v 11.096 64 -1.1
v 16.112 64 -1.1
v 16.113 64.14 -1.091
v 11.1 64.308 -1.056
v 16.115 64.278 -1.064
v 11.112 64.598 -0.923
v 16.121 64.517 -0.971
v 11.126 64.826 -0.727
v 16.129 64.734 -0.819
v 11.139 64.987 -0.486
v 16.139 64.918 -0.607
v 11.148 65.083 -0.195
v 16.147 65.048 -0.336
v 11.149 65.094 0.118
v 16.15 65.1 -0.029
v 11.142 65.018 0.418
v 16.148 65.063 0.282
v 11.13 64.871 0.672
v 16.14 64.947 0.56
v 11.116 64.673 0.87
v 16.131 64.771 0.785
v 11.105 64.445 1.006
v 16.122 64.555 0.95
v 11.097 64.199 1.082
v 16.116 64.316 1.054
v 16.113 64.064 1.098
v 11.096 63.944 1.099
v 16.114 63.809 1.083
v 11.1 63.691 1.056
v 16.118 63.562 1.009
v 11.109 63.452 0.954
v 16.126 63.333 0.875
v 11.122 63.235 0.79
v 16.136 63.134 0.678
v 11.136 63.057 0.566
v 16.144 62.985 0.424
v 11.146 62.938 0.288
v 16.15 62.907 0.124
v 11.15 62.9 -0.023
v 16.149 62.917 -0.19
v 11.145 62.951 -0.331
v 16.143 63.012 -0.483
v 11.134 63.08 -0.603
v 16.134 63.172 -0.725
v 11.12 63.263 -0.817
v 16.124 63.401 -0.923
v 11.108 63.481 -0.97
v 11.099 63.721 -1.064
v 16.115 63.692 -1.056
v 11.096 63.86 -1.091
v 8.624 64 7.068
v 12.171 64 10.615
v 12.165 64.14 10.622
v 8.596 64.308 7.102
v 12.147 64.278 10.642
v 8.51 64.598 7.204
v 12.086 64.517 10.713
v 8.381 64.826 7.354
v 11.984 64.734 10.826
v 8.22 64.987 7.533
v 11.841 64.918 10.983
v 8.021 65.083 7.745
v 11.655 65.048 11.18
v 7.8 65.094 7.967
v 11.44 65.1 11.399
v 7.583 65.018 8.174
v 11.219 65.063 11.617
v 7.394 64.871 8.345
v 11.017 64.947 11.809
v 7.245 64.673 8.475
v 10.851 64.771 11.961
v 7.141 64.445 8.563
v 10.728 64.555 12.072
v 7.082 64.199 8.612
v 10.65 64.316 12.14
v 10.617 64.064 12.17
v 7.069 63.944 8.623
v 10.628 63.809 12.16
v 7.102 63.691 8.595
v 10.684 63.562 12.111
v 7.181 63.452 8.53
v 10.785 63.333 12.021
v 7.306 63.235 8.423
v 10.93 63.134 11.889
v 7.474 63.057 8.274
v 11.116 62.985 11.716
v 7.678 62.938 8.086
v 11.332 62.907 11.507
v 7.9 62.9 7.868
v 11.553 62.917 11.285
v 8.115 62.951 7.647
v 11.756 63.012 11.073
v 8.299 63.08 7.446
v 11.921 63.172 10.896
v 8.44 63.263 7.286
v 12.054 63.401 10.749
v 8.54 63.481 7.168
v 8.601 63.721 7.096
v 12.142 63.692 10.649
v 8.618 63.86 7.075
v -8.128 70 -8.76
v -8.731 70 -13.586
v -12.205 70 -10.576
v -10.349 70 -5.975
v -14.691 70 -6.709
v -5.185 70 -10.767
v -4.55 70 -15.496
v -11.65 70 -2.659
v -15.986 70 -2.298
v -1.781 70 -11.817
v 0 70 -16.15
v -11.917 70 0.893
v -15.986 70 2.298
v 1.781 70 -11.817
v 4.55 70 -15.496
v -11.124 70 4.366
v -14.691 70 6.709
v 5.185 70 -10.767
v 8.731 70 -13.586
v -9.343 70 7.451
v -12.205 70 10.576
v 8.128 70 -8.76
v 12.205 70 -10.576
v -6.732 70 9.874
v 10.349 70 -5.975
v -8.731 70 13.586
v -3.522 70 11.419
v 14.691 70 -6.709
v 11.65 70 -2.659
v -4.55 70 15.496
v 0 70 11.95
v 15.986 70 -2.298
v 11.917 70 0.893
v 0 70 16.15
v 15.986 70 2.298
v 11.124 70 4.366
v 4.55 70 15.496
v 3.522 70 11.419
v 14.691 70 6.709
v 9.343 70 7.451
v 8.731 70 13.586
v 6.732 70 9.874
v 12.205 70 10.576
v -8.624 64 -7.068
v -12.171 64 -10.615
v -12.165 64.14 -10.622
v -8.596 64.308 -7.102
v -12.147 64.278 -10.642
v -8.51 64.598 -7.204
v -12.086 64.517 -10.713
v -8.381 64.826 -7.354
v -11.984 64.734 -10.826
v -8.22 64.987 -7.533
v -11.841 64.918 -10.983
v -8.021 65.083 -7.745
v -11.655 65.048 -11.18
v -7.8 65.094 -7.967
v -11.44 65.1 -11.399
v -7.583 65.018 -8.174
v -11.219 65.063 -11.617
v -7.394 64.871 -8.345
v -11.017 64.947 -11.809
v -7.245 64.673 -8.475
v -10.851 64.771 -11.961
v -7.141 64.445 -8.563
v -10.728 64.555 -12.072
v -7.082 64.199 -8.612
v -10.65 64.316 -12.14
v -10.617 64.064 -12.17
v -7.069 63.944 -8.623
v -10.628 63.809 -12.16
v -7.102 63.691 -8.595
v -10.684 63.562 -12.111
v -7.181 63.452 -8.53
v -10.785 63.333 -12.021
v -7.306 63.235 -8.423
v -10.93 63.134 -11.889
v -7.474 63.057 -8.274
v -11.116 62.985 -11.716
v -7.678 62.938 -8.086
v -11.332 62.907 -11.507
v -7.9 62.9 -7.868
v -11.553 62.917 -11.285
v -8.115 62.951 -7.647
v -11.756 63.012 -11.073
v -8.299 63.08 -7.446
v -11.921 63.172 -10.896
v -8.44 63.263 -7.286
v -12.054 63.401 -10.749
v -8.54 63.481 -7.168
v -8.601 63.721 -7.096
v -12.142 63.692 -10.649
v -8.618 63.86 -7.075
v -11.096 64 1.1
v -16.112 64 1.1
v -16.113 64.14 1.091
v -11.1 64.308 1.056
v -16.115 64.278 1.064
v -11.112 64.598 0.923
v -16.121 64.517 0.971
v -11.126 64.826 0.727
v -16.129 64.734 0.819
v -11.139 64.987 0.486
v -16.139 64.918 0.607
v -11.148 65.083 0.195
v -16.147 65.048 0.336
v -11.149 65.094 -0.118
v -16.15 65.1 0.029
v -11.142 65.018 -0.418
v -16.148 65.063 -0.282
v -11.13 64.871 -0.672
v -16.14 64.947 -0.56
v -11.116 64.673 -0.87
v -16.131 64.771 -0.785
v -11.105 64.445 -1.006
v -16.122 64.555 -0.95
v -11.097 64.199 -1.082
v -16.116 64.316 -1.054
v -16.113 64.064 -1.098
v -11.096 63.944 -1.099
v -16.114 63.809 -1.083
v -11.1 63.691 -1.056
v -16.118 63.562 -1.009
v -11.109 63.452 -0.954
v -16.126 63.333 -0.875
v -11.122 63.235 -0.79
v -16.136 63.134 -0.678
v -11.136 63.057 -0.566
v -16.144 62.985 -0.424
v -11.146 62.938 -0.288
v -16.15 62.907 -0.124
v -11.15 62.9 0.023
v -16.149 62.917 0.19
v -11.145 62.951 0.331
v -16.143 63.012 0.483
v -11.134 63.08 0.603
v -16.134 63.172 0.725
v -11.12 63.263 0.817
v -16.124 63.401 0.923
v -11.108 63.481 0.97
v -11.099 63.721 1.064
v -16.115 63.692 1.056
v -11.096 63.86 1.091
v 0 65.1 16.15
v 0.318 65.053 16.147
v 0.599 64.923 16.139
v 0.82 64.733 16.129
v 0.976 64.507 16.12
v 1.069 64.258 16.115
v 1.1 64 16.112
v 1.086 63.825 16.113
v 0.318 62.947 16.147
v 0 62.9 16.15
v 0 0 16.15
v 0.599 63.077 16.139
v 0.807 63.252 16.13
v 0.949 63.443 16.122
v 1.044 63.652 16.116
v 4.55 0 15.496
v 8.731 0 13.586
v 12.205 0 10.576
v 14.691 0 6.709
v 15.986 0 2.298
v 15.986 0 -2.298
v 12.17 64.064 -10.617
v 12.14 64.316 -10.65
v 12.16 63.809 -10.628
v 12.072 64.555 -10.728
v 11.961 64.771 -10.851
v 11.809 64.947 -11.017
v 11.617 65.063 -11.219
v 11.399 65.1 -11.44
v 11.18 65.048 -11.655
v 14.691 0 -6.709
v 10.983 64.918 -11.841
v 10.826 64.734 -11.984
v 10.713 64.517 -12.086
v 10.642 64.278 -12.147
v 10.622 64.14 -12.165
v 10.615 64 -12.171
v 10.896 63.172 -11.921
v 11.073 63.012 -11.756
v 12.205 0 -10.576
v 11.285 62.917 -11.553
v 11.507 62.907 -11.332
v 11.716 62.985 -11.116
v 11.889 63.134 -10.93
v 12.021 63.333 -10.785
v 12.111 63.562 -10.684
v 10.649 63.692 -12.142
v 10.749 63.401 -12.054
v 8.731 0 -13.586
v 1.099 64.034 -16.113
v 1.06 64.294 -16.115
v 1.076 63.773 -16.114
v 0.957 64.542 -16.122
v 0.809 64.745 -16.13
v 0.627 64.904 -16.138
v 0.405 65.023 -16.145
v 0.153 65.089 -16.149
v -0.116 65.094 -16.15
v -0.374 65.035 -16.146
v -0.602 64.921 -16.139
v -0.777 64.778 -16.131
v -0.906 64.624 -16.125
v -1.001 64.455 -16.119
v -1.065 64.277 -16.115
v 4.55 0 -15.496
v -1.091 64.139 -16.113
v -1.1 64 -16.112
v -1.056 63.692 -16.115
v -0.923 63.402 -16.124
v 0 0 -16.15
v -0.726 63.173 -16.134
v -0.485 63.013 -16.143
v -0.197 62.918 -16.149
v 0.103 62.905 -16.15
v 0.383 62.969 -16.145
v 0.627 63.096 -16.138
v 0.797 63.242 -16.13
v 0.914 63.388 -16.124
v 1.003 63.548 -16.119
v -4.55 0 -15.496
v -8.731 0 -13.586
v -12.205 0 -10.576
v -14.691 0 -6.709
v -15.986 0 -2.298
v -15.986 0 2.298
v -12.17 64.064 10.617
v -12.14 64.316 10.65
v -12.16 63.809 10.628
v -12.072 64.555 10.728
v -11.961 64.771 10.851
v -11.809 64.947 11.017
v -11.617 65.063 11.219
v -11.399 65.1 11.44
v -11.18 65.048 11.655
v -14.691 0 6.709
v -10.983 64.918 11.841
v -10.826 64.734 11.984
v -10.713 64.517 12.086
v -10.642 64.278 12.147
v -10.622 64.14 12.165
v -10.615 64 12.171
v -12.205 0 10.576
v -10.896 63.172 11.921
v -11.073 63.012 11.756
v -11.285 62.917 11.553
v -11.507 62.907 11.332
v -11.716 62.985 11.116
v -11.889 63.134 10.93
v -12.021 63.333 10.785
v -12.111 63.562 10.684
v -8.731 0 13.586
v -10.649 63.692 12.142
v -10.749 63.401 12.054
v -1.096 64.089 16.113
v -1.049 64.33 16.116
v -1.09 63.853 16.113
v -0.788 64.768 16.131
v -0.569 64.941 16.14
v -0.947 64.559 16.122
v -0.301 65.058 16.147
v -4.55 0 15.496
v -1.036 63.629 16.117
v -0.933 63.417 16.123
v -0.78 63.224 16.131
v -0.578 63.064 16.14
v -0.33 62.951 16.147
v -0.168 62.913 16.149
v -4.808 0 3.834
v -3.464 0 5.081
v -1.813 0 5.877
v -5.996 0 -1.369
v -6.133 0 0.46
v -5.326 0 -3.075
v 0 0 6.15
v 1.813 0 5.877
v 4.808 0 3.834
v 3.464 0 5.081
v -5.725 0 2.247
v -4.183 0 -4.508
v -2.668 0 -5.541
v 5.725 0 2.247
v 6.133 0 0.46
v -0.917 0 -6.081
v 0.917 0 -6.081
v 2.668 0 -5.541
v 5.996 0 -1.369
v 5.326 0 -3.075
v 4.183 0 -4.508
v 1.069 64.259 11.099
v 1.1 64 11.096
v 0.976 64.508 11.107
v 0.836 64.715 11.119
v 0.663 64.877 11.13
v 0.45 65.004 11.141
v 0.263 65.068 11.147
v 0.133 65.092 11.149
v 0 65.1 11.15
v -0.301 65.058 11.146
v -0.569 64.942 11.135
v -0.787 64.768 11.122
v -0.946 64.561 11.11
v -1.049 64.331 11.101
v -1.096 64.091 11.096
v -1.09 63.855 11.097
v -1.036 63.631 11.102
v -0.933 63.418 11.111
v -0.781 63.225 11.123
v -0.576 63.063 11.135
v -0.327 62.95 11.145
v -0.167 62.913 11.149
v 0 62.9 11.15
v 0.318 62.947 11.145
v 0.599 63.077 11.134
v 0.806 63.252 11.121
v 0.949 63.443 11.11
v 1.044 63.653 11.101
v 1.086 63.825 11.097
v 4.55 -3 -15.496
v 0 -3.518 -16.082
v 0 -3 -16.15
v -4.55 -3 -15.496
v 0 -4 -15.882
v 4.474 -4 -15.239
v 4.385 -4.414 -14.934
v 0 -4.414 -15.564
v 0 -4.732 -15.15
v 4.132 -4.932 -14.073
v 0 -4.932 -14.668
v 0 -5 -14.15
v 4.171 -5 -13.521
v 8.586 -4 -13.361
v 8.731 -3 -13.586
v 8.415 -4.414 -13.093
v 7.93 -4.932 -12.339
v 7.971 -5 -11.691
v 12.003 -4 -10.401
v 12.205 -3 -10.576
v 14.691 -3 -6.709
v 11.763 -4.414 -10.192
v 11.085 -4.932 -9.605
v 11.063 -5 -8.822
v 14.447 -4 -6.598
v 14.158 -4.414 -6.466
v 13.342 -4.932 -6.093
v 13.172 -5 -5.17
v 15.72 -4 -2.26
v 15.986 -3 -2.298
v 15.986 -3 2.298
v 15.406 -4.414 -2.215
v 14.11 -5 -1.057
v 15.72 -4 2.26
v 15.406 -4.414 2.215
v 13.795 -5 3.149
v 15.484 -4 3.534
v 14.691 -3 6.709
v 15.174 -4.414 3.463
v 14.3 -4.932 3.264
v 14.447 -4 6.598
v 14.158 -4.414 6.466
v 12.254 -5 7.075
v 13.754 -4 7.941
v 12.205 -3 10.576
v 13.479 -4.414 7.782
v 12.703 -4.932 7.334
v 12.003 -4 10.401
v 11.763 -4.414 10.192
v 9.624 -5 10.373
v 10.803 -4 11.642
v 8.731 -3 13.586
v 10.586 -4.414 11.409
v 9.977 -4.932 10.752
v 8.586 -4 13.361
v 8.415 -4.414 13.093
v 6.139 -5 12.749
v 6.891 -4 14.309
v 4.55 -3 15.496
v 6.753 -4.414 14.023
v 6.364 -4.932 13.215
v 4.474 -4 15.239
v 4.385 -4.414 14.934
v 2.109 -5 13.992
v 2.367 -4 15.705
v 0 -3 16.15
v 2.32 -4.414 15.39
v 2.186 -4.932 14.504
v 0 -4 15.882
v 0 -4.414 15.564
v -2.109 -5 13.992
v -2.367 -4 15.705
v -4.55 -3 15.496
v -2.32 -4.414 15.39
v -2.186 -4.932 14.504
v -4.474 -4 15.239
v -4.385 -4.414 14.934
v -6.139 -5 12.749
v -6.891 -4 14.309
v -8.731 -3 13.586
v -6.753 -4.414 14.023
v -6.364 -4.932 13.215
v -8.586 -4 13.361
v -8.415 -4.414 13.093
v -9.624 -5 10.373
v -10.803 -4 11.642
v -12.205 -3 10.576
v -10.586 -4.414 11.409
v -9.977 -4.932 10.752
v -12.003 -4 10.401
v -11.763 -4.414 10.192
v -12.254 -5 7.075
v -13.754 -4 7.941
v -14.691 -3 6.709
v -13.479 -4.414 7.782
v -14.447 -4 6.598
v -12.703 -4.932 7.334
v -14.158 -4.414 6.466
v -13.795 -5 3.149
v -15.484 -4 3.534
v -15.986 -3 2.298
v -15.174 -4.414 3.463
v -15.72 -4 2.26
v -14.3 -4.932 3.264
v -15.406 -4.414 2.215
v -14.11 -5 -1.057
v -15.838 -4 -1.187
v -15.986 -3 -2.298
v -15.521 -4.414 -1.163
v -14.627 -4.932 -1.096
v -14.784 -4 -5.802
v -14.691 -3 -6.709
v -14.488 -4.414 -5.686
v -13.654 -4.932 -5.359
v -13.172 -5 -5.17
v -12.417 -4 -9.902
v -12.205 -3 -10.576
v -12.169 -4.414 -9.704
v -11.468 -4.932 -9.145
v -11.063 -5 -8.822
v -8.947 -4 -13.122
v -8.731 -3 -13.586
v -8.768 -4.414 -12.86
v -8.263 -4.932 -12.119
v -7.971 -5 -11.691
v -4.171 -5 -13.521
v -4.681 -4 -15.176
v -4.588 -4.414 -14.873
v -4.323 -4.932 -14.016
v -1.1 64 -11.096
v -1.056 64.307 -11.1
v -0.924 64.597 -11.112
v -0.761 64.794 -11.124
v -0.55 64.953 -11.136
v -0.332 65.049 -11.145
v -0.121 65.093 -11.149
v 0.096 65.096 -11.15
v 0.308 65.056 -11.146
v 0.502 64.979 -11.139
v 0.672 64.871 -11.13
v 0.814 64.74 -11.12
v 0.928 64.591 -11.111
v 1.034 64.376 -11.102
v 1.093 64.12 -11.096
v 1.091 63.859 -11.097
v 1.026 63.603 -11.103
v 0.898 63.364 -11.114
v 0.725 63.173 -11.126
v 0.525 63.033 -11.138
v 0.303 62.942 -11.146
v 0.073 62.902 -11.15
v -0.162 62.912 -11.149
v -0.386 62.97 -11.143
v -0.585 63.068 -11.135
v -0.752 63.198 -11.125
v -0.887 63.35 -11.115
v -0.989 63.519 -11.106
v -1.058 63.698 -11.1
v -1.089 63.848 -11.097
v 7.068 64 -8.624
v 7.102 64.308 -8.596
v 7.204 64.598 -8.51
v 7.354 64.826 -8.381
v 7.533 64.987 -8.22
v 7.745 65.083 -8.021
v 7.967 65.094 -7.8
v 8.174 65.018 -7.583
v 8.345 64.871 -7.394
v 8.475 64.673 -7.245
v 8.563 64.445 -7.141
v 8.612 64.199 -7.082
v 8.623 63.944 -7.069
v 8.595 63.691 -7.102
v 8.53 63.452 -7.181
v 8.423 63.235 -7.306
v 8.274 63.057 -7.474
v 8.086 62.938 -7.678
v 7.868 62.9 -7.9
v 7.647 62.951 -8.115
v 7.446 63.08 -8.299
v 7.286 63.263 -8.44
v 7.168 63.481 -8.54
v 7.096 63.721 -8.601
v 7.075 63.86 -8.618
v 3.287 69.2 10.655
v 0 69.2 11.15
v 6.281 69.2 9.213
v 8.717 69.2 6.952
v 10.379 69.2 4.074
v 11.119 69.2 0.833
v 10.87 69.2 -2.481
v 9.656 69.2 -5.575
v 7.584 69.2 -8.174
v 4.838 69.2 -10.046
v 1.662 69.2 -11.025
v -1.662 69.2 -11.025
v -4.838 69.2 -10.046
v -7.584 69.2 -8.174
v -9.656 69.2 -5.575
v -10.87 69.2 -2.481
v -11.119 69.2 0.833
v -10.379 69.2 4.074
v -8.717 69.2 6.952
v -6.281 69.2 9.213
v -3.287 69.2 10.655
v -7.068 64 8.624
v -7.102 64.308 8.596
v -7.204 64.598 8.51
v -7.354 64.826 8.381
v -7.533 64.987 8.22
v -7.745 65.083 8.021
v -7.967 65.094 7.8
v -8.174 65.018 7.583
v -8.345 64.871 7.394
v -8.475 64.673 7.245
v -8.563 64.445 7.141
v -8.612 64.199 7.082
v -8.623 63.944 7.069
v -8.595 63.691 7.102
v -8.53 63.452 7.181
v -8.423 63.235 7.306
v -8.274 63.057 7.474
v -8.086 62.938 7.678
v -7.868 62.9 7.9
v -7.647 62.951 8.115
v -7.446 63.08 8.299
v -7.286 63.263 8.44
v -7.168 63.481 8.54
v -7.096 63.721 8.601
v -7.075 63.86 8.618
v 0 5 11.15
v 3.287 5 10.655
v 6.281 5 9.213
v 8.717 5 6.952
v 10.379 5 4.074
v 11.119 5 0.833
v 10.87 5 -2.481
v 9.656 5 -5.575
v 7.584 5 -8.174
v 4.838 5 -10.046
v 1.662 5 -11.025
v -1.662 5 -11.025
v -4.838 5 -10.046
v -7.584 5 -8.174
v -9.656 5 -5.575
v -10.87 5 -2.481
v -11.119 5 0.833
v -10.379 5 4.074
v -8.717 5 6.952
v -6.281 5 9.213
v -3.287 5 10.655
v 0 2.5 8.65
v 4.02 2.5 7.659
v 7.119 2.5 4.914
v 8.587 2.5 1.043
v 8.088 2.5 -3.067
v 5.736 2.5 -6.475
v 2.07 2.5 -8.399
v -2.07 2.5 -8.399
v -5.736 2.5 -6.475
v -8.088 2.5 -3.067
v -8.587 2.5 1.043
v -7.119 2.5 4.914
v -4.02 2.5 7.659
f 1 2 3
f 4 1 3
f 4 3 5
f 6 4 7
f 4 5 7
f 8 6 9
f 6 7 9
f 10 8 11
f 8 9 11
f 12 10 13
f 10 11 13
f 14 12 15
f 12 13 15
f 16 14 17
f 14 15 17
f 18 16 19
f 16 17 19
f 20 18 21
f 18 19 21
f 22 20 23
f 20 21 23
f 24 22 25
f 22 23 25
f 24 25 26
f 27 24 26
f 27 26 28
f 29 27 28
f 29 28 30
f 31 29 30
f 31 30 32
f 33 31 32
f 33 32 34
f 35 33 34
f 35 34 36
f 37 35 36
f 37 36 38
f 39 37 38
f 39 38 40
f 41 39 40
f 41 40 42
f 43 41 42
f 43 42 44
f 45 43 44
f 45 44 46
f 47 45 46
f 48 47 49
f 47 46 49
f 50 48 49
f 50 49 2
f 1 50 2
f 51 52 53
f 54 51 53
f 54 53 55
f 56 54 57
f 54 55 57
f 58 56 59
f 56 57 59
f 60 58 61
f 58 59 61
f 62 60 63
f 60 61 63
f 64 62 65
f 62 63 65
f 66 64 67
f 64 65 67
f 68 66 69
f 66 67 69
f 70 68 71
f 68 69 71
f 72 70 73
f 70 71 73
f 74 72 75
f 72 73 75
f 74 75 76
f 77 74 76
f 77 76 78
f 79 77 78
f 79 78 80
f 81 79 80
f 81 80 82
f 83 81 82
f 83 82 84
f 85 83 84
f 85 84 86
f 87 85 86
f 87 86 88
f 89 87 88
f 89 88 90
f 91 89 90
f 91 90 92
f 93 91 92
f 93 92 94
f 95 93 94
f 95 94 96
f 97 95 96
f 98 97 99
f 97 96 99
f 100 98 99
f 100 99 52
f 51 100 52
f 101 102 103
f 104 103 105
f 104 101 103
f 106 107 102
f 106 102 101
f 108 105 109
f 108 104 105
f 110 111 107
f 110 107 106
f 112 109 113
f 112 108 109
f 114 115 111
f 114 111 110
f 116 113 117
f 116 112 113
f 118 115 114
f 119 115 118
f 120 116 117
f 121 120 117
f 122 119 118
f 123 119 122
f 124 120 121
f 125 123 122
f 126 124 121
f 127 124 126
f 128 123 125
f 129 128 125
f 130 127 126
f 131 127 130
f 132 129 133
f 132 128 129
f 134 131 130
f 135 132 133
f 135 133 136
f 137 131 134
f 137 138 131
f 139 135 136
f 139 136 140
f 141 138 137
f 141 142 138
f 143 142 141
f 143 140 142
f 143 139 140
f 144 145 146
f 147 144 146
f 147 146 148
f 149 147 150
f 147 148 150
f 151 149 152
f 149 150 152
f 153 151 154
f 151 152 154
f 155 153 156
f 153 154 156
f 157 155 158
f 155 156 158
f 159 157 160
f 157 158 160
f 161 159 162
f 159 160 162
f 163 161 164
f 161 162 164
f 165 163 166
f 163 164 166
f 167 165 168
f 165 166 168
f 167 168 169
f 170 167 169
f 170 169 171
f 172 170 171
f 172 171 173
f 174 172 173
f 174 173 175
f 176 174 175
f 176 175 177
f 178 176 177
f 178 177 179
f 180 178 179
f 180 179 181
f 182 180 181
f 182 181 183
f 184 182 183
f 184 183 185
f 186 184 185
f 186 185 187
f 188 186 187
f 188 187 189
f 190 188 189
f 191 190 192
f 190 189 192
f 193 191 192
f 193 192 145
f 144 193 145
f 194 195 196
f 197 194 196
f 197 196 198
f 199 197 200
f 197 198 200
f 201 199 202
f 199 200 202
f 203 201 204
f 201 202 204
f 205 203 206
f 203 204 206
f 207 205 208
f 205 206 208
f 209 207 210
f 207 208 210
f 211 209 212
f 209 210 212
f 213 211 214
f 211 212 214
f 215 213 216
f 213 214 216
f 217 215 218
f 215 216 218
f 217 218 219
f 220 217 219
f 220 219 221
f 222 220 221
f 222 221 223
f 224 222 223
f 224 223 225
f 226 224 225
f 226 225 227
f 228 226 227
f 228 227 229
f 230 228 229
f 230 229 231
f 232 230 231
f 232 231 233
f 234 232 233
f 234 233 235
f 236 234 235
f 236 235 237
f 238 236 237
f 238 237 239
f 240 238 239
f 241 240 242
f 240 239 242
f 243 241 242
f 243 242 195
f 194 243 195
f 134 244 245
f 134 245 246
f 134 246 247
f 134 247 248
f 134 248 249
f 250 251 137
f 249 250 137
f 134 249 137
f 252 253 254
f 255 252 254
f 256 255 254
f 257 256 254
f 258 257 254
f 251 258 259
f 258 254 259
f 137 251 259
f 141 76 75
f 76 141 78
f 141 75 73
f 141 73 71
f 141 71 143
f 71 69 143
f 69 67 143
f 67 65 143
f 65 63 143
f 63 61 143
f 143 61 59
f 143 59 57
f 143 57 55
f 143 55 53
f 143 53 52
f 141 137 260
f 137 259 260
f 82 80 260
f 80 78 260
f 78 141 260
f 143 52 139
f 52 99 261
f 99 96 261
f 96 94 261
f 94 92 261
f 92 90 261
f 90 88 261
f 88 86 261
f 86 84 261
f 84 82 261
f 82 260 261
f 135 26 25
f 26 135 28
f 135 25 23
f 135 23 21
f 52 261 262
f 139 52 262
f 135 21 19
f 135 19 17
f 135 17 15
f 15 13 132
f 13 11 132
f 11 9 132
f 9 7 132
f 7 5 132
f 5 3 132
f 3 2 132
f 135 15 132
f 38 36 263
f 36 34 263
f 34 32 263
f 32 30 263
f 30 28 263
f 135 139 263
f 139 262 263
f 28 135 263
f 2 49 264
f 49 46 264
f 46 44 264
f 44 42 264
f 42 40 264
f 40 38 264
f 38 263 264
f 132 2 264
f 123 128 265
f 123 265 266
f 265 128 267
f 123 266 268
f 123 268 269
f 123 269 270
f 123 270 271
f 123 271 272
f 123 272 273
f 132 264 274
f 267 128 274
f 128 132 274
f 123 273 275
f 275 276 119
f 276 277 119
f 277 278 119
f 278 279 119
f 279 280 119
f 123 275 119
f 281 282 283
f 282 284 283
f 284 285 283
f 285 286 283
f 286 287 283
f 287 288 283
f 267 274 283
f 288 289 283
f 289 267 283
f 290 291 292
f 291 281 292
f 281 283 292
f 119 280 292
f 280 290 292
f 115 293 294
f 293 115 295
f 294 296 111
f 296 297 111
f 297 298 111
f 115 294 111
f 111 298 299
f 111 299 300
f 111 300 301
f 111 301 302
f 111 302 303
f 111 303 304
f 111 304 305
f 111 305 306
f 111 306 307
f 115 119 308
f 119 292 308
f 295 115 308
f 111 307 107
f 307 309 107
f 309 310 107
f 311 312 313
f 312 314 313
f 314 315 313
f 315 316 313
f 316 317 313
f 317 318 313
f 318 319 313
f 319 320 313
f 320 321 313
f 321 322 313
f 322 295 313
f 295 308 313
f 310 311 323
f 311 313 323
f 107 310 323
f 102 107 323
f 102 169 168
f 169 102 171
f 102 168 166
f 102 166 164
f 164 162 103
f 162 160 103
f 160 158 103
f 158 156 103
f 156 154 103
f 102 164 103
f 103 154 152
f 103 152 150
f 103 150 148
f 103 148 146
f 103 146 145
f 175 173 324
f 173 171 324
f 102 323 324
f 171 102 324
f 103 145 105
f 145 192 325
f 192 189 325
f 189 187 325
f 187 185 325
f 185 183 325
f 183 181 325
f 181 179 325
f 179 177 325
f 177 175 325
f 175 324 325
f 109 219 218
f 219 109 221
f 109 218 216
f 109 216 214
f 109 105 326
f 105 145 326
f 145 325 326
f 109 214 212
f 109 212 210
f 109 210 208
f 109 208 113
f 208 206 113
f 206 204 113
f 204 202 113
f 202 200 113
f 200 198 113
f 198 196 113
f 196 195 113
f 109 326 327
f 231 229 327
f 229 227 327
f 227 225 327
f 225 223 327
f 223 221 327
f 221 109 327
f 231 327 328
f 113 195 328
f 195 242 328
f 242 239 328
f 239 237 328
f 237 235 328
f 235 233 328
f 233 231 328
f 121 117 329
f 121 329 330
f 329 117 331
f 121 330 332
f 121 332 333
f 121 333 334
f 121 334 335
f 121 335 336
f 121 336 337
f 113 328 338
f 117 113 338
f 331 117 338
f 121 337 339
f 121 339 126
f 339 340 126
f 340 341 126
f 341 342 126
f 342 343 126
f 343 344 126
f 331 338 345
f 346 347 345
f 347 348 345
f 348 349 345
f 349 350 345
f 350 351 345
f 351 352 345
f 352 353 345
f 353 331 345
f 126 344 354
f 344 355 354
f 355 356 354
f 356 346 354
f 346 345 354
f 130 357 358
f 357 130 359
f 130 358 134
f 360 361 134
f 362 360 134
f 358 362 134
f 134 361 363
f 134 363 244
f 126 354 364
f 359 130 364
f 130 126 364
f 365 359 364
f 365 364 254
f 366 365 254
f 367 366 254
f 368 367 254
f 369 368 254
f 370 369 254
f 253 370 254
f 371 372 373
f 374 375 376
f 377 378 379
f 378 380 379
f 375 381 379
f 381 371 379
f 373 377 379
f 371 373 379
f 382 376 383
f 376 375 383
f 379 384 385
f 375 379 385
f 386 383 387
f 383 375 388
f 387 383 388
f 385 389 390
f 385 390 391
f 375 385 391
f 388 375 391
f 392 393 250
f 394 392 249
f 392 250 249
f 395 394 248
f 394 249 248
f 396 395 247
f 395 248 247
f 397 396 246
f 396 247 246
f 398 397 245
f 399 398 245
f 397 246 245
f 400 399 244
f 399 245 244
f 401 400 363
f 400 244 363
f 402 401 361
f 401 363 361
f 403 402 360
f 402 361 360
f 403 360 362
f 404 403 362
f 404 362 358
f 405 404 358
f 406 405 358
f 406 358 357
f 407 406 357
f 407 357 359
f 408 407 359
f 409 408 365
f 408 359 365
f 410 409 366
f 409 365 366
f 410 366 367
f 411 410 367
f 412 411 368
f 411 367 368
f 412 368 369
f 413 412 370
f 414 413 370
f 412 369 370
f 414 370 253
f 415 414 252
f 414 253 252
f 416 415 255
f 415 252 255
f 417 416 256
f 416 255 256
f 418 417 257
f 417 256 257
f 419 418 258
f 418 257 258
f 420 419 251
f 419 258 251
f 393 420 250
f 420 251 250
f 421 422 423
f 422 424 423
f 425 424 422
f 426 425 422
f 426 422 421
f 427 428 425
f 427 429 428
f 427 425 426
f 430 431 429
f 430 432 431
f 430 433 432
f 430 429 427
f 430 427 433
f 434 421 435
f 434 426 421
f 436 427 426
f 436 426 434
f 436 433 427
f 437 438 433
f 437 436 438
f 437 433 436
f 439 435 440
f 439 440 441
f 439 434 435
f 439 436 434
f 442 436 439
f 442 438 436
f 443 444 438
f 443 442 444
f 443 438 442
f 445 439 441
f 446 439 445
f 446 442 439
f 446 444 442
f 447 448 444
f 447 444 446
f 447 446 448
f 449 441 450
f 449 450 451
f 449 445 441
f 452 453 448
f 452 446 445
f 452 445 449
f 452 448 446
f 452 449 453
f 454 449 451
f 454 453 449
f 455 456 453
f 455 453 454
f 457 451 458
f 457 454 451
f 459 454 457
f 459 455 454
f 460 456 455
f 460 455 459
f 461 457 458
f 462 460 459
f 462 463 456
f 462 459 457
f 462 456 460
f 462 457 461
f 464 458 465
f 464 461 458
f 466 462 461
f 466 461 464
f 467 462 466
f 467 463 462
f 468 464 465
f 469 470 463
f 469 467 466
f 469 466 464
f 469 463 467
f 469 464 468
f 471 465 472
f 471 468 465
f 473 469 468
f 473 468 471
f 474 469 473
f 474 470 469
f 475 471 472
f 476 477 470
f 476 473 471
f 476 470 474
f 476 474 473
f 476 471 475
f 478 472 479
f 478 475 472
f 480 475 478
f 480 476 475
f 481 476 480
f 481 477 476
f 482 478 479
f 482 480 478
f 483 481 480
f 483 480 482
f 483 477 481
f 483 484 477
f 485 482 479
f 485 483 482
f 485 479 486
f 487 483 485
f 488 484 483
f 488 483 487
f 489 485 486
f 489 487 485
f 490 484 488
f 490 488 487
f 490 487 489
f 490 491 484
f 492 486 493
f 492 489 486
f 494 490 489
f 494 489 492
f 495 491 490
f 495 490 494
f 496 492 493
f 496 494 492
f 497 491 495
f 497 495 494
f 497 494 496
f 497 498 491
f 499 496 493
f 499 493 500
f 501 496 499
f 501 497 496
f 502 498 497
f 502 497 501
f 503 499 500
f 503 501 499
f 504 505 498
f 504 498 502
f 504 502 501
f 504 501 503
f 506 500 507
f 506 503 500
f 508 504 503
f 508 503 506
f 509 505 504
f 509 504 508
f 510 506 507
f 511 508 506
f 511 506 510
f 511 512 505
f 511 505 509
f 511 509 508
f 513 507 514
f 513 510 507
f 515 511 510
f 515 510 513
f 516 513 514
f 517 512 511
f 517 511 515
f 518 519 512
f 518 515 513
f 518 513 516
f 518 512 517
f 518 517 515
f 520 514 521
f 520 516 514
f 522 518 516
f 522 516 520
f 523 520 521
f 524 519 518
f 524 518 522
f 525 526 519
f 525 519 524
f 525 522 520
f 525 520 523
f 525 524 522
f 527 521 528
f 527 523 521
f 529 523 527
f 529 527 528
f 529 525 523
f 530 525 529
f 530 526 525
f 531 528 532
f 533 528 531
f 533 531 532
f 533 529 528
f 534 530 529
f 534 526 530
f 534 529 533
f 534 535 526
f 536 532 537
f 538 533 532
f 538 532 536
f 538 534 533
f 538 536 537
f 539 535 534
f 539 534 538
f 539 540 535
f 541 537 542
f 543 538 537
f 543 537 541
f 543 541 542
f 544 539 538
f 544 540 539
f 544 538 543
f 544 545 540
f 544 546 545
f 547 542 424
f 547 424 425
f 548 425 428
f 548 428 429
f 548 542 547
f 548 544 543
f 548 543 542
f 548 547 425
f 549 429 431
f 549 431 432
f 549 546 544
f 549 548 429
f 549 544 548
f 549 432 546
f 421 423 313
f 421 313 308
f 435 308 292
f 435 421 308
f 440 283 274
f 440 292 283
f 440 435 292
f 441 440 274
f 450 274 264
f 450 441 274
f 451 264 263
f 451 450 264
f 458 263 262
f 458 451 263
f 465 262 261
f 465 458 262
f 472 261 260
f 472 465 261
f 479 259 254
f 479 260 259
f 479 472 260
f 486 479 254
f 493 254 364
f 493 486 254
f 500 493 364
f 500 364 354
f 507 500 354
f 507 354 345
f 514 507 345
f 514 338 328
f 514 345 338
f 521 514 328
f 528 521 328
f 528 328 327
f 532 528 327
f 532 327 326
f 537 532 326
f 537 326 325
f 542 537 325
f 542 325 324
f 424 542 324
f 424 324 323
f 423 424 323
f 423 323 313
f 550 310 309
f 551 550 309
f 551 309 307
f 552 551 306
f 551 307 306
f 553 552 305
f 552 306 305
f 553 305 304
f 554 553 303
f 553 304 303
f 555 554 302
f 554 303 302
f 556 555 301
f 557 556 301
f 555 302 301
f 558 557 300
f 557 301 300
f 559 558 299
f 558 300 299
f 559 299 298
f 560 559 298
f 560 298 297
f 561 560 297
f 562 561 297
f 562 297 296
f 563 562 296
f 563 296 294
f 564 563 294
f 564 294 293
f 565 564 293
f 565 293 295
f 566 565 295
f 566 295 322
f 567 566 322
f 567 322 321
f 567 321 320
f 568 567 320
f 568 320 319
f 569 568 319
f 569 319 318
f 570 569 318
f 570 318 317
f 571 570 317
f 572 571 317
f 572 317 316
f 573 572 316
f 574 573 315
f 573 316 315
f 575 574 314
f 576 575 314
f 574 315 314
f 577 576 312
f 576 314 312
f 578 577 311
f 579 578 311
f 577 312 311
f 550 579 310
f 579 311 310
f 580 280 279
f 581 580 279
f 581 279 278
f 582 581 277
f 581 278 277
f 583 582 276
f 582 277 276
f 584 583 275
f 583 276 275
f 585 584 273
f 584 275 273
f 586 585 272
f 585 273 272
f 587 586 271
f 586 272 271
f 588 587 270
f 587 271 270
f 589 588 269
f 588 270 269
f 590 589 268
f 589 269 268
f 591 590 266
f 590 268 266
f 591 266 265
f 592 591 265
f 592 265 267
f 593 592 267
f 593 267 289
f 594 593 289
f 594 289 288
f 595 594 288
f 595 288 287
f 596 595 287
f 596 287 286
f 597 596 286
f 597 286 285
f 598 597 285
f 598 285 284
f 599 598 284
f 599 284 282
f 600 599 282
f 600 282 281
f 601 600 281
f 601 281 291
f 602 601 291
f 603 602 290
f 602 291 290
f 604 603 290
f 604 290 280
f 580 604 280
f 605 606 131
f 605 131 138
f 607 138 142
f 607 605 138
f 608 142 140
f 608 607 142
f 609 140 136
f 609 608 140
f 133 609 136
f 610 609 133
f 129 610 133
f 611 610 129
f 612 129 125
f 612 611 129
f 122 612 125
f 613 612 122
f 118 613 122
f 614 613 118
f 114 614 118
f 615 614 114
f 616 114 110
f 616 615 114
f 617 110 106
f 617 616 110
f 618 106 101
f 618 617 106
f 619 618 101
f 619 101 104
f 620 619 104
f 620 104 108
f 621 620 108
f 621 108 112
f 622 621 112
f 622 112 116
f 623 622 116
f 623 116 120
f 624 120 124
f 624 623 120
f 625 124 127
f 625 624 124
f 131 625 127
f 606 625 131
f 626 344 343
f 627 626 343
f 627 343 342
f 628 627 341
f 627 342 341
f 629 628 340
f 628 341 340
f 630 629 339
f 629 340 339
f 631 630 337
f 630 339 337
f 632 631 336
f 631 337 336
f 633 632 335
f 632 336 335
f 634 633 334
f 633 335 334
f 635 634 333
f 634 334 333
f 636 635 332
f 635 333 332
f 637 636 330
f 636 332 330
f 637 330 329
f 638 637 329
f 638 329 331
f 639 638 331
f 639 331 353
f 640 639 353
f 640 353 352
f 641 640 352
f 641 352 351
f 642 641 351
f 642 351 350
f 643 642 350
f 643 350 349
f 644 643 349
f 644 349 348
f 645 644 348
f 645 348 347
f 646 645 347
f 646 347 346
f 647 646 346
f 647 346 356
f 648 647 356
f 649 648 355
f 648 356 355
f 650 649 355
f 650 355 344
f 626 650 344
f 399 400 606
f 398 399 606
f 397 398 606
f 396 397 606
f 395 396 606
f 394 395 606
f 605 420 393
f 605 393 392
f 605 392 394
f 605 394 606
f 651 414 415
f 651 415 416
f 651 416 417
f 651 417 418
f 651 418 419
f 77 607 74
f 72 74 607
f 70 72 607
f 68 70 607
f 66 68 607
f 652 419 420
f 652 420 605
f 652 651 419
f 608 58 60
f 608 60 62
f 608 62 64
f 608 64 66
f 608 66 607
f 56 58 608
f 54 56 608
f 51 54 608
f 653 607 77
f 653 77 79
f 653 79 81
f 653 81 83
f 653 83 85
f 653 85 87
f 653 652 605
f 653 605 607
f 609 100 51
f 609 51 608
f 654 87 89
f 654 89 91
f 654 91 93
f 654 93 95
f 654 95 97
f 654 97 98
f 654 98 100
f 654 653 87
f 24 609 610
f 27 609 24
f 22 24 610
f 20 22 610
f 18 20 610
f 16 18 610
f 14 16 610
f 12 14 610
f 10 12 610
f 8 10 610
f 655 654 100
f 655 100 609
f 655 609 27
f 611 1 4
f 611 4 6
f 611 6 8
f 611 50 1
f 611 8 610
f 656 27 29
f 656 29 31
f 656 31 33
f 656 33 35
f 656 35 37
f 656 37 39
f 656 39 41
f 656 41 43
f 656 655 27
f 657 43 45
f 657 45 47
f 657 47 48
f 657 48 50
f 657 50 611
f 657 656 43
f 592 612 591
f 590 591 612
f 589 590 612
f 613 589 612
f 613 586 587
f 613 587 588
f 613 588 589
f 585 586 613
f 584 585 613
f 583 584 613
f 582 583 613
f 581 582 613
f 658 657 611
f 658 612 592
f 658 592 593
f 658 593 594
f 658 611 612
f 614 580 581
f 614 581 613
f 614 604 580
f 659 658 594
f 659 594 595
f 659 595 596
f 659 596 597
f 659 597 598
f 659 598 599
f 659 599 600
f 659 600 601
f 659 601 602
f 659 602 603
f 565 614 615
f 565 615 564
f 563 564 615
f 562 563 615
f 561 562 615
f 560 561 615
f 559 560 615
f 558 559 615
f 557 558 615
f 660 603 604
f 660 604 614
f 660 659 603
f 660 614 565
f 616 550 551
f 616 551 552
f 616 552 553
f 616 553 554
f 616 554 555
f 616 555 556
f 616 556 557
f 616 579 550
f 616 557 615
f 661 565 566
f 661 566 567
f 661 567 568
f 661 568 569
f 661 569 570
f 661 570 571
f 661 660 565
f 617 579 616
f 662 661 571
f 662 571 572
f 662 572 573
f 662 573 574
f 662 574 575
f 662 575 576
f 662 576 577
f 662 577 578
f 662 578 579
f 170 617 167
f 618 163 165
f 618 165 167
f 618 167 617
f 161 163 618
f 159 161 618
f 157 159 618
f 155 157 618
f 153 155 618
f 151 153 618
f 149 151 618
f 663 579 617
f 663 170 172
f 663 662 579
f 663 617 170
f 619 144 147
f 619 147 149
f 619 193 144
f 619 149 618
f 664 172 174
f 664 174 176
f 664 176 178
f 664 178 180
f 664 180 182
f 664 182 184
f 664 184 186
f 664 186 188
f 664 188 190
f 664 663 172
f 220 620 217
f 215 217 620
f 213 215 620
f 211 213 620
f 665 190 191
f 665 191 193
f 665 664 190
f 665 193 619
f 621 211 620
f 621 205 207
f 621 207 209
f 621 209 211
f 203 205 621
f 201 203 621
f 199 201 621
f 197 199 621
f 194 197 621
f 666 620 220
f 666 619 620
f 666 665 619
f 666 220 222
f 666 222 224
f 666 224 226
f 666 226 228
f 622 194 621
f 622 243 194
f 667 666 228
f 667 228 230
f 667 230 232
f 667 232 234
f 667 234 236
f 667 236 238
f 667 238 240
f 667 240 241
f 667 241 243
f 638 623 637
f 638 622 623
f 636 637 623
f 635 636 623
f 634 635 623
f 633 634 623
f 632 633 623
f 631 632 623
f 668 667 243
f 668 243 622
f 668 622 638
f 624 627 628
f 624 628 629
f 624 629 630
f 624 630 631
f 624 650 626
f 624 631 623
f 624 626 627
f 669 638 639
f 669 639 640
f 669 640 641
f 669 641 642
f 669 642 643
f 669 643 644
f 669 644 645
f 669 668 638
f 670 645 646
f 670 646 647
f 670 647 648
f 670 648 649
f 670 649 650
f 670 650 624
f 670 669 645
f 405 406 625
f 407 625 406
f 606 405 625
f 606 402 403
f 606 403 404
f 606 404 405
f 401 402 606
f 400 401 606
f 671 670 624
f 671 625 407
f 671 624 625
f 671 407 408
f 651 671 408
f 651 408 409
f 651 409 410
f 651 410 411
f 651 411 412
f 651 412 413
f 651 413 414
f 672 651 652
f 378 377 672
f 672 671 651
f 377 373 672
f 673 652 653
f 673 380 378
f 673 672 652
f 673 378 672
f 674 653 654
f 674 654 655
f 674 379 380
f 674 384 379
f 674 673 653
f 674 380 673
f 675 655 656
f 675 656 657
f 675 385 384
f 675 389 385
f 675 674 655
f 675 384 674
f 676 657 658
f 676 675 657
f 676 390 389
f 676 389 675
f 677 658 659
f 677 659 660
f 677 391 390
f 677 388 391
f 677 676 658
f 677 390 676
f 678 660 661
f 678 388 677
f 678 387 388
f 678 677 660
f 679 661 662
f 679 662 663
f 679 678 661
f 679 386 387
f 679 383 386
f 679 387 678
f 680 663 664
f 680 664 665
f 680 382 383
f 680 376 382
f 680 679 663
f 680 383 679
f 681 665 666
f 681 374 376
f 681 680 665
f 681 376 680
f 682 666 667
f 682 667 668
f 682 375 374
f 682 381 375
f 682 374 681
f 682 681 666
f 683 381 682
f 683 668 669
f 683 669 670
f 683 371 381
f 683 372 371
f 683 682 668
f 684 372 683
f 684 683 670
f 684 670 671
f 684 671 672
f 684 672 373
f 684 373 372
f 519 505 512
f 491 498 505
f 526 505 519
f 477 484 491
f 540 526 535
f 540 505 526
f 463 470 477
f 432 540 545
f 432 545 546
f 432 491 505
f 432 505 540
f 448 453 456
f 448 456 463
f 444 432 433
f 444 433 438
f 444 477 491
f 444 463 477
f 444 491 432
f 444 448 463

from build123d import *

# Parameters (mm, degrees)
SKETCH1_R           = 16.15
SKETCH1_R_2         = 11.15
BOSS_EXTRUDE1_DEPTH = 70
BOSS_EXTRUDE2_START = 5
SKETCH2_R           = 16.15
BOSS_EXTRUDE2_DEPTH = 5
CHAMFER1_SIZE       = 5
FILLET1_R           = 2
CHAMFER2_SIZE       = 0.8
SKETCH3_R           = 1.1
CUT_EXTRUDE1_DEPTH  = 10
CIRPATTERN1_COUNT   = 8


with BuildPart() as part:
    # Sketch1 → Boss-Extrude1 (new body)
    with BuildSketch(Plane(origin=(0, 0, 0), x_dir=(1, 0, 0), z_dir=(0, 1, 0))):
        with Locations(Location((0, 0, 0), (0, 0, 270))):
            Circle(SKETCH1_R)
        with Locations(Location((0, 0, 0), (0, 0, 270))):
            Circle(SKETCH1_R_2, mode=Mode.SUBTRACT)
    extrude(amount=BOSS_EXTRUDE1_DEPTH)

    # Sketch2 → Boss-Extrude2 (add)
    with BuildSketch(Plane.XZ.offset(BOSS_EXTRUDE2_START)):
        with Locations(Location((0, 0, 0), (0, 0, 270))):
            Circle(SKETCH2_R)
    extrude(amount=-BOSS_EXTRUDE2_DEPTH)

    # Chamfer1
    chamfer1_edges = [part.edges().sort_by_distance(p)[0] for p in [
        (0, 0, -11.15),
    ]]
    chamfer(chamfer1_edges, length=CHAMFER1_SIZE)

    # Fillet1
    fillet1_edges = [part.edges().sort_by_distance(p)[0] for p in [
        (0, -5, 16.15),
    ]]
    fillet(fillet1_edges, radius=FILLET1_R)

    # Chamfer2
    chamfer2_edges = [part.edges().sort_by_distance(p)[0] for p in [
        (0, 70, -11.15),
    ]]
    chamfer(chamfer2_edges, length=CHAMFER2_SIZE)

    # Sketch3 → Cut-Extrude1 (cut)
    with BuildSketch(Plane(origin=(16.15, 0, 0), x_dir=(0, 0, -1), z_dir=(1, 0, 0))):
        with Locations((0, 64)):
            Circle(SKETCH3_R)
    cut_extrude1 = extrude(amount=-CUT_EXTRUDE1_DEPTH, mode=Mode.SUBTRACT)

    # CirPattern1: Cut-Extrude1 ×8 about axis
    cirpattern1_axis = Axis((0, 69.2, 0), (0, -1, 0))
    for i in range(1, CIRPATTERN1_COUNT):
        add(cut_extrude1.rotate(cirpattern1_axis, i * 360 / CIRPATTERN1_COUNT), mode=Mode.SUBTRACT)


solid = part.part
